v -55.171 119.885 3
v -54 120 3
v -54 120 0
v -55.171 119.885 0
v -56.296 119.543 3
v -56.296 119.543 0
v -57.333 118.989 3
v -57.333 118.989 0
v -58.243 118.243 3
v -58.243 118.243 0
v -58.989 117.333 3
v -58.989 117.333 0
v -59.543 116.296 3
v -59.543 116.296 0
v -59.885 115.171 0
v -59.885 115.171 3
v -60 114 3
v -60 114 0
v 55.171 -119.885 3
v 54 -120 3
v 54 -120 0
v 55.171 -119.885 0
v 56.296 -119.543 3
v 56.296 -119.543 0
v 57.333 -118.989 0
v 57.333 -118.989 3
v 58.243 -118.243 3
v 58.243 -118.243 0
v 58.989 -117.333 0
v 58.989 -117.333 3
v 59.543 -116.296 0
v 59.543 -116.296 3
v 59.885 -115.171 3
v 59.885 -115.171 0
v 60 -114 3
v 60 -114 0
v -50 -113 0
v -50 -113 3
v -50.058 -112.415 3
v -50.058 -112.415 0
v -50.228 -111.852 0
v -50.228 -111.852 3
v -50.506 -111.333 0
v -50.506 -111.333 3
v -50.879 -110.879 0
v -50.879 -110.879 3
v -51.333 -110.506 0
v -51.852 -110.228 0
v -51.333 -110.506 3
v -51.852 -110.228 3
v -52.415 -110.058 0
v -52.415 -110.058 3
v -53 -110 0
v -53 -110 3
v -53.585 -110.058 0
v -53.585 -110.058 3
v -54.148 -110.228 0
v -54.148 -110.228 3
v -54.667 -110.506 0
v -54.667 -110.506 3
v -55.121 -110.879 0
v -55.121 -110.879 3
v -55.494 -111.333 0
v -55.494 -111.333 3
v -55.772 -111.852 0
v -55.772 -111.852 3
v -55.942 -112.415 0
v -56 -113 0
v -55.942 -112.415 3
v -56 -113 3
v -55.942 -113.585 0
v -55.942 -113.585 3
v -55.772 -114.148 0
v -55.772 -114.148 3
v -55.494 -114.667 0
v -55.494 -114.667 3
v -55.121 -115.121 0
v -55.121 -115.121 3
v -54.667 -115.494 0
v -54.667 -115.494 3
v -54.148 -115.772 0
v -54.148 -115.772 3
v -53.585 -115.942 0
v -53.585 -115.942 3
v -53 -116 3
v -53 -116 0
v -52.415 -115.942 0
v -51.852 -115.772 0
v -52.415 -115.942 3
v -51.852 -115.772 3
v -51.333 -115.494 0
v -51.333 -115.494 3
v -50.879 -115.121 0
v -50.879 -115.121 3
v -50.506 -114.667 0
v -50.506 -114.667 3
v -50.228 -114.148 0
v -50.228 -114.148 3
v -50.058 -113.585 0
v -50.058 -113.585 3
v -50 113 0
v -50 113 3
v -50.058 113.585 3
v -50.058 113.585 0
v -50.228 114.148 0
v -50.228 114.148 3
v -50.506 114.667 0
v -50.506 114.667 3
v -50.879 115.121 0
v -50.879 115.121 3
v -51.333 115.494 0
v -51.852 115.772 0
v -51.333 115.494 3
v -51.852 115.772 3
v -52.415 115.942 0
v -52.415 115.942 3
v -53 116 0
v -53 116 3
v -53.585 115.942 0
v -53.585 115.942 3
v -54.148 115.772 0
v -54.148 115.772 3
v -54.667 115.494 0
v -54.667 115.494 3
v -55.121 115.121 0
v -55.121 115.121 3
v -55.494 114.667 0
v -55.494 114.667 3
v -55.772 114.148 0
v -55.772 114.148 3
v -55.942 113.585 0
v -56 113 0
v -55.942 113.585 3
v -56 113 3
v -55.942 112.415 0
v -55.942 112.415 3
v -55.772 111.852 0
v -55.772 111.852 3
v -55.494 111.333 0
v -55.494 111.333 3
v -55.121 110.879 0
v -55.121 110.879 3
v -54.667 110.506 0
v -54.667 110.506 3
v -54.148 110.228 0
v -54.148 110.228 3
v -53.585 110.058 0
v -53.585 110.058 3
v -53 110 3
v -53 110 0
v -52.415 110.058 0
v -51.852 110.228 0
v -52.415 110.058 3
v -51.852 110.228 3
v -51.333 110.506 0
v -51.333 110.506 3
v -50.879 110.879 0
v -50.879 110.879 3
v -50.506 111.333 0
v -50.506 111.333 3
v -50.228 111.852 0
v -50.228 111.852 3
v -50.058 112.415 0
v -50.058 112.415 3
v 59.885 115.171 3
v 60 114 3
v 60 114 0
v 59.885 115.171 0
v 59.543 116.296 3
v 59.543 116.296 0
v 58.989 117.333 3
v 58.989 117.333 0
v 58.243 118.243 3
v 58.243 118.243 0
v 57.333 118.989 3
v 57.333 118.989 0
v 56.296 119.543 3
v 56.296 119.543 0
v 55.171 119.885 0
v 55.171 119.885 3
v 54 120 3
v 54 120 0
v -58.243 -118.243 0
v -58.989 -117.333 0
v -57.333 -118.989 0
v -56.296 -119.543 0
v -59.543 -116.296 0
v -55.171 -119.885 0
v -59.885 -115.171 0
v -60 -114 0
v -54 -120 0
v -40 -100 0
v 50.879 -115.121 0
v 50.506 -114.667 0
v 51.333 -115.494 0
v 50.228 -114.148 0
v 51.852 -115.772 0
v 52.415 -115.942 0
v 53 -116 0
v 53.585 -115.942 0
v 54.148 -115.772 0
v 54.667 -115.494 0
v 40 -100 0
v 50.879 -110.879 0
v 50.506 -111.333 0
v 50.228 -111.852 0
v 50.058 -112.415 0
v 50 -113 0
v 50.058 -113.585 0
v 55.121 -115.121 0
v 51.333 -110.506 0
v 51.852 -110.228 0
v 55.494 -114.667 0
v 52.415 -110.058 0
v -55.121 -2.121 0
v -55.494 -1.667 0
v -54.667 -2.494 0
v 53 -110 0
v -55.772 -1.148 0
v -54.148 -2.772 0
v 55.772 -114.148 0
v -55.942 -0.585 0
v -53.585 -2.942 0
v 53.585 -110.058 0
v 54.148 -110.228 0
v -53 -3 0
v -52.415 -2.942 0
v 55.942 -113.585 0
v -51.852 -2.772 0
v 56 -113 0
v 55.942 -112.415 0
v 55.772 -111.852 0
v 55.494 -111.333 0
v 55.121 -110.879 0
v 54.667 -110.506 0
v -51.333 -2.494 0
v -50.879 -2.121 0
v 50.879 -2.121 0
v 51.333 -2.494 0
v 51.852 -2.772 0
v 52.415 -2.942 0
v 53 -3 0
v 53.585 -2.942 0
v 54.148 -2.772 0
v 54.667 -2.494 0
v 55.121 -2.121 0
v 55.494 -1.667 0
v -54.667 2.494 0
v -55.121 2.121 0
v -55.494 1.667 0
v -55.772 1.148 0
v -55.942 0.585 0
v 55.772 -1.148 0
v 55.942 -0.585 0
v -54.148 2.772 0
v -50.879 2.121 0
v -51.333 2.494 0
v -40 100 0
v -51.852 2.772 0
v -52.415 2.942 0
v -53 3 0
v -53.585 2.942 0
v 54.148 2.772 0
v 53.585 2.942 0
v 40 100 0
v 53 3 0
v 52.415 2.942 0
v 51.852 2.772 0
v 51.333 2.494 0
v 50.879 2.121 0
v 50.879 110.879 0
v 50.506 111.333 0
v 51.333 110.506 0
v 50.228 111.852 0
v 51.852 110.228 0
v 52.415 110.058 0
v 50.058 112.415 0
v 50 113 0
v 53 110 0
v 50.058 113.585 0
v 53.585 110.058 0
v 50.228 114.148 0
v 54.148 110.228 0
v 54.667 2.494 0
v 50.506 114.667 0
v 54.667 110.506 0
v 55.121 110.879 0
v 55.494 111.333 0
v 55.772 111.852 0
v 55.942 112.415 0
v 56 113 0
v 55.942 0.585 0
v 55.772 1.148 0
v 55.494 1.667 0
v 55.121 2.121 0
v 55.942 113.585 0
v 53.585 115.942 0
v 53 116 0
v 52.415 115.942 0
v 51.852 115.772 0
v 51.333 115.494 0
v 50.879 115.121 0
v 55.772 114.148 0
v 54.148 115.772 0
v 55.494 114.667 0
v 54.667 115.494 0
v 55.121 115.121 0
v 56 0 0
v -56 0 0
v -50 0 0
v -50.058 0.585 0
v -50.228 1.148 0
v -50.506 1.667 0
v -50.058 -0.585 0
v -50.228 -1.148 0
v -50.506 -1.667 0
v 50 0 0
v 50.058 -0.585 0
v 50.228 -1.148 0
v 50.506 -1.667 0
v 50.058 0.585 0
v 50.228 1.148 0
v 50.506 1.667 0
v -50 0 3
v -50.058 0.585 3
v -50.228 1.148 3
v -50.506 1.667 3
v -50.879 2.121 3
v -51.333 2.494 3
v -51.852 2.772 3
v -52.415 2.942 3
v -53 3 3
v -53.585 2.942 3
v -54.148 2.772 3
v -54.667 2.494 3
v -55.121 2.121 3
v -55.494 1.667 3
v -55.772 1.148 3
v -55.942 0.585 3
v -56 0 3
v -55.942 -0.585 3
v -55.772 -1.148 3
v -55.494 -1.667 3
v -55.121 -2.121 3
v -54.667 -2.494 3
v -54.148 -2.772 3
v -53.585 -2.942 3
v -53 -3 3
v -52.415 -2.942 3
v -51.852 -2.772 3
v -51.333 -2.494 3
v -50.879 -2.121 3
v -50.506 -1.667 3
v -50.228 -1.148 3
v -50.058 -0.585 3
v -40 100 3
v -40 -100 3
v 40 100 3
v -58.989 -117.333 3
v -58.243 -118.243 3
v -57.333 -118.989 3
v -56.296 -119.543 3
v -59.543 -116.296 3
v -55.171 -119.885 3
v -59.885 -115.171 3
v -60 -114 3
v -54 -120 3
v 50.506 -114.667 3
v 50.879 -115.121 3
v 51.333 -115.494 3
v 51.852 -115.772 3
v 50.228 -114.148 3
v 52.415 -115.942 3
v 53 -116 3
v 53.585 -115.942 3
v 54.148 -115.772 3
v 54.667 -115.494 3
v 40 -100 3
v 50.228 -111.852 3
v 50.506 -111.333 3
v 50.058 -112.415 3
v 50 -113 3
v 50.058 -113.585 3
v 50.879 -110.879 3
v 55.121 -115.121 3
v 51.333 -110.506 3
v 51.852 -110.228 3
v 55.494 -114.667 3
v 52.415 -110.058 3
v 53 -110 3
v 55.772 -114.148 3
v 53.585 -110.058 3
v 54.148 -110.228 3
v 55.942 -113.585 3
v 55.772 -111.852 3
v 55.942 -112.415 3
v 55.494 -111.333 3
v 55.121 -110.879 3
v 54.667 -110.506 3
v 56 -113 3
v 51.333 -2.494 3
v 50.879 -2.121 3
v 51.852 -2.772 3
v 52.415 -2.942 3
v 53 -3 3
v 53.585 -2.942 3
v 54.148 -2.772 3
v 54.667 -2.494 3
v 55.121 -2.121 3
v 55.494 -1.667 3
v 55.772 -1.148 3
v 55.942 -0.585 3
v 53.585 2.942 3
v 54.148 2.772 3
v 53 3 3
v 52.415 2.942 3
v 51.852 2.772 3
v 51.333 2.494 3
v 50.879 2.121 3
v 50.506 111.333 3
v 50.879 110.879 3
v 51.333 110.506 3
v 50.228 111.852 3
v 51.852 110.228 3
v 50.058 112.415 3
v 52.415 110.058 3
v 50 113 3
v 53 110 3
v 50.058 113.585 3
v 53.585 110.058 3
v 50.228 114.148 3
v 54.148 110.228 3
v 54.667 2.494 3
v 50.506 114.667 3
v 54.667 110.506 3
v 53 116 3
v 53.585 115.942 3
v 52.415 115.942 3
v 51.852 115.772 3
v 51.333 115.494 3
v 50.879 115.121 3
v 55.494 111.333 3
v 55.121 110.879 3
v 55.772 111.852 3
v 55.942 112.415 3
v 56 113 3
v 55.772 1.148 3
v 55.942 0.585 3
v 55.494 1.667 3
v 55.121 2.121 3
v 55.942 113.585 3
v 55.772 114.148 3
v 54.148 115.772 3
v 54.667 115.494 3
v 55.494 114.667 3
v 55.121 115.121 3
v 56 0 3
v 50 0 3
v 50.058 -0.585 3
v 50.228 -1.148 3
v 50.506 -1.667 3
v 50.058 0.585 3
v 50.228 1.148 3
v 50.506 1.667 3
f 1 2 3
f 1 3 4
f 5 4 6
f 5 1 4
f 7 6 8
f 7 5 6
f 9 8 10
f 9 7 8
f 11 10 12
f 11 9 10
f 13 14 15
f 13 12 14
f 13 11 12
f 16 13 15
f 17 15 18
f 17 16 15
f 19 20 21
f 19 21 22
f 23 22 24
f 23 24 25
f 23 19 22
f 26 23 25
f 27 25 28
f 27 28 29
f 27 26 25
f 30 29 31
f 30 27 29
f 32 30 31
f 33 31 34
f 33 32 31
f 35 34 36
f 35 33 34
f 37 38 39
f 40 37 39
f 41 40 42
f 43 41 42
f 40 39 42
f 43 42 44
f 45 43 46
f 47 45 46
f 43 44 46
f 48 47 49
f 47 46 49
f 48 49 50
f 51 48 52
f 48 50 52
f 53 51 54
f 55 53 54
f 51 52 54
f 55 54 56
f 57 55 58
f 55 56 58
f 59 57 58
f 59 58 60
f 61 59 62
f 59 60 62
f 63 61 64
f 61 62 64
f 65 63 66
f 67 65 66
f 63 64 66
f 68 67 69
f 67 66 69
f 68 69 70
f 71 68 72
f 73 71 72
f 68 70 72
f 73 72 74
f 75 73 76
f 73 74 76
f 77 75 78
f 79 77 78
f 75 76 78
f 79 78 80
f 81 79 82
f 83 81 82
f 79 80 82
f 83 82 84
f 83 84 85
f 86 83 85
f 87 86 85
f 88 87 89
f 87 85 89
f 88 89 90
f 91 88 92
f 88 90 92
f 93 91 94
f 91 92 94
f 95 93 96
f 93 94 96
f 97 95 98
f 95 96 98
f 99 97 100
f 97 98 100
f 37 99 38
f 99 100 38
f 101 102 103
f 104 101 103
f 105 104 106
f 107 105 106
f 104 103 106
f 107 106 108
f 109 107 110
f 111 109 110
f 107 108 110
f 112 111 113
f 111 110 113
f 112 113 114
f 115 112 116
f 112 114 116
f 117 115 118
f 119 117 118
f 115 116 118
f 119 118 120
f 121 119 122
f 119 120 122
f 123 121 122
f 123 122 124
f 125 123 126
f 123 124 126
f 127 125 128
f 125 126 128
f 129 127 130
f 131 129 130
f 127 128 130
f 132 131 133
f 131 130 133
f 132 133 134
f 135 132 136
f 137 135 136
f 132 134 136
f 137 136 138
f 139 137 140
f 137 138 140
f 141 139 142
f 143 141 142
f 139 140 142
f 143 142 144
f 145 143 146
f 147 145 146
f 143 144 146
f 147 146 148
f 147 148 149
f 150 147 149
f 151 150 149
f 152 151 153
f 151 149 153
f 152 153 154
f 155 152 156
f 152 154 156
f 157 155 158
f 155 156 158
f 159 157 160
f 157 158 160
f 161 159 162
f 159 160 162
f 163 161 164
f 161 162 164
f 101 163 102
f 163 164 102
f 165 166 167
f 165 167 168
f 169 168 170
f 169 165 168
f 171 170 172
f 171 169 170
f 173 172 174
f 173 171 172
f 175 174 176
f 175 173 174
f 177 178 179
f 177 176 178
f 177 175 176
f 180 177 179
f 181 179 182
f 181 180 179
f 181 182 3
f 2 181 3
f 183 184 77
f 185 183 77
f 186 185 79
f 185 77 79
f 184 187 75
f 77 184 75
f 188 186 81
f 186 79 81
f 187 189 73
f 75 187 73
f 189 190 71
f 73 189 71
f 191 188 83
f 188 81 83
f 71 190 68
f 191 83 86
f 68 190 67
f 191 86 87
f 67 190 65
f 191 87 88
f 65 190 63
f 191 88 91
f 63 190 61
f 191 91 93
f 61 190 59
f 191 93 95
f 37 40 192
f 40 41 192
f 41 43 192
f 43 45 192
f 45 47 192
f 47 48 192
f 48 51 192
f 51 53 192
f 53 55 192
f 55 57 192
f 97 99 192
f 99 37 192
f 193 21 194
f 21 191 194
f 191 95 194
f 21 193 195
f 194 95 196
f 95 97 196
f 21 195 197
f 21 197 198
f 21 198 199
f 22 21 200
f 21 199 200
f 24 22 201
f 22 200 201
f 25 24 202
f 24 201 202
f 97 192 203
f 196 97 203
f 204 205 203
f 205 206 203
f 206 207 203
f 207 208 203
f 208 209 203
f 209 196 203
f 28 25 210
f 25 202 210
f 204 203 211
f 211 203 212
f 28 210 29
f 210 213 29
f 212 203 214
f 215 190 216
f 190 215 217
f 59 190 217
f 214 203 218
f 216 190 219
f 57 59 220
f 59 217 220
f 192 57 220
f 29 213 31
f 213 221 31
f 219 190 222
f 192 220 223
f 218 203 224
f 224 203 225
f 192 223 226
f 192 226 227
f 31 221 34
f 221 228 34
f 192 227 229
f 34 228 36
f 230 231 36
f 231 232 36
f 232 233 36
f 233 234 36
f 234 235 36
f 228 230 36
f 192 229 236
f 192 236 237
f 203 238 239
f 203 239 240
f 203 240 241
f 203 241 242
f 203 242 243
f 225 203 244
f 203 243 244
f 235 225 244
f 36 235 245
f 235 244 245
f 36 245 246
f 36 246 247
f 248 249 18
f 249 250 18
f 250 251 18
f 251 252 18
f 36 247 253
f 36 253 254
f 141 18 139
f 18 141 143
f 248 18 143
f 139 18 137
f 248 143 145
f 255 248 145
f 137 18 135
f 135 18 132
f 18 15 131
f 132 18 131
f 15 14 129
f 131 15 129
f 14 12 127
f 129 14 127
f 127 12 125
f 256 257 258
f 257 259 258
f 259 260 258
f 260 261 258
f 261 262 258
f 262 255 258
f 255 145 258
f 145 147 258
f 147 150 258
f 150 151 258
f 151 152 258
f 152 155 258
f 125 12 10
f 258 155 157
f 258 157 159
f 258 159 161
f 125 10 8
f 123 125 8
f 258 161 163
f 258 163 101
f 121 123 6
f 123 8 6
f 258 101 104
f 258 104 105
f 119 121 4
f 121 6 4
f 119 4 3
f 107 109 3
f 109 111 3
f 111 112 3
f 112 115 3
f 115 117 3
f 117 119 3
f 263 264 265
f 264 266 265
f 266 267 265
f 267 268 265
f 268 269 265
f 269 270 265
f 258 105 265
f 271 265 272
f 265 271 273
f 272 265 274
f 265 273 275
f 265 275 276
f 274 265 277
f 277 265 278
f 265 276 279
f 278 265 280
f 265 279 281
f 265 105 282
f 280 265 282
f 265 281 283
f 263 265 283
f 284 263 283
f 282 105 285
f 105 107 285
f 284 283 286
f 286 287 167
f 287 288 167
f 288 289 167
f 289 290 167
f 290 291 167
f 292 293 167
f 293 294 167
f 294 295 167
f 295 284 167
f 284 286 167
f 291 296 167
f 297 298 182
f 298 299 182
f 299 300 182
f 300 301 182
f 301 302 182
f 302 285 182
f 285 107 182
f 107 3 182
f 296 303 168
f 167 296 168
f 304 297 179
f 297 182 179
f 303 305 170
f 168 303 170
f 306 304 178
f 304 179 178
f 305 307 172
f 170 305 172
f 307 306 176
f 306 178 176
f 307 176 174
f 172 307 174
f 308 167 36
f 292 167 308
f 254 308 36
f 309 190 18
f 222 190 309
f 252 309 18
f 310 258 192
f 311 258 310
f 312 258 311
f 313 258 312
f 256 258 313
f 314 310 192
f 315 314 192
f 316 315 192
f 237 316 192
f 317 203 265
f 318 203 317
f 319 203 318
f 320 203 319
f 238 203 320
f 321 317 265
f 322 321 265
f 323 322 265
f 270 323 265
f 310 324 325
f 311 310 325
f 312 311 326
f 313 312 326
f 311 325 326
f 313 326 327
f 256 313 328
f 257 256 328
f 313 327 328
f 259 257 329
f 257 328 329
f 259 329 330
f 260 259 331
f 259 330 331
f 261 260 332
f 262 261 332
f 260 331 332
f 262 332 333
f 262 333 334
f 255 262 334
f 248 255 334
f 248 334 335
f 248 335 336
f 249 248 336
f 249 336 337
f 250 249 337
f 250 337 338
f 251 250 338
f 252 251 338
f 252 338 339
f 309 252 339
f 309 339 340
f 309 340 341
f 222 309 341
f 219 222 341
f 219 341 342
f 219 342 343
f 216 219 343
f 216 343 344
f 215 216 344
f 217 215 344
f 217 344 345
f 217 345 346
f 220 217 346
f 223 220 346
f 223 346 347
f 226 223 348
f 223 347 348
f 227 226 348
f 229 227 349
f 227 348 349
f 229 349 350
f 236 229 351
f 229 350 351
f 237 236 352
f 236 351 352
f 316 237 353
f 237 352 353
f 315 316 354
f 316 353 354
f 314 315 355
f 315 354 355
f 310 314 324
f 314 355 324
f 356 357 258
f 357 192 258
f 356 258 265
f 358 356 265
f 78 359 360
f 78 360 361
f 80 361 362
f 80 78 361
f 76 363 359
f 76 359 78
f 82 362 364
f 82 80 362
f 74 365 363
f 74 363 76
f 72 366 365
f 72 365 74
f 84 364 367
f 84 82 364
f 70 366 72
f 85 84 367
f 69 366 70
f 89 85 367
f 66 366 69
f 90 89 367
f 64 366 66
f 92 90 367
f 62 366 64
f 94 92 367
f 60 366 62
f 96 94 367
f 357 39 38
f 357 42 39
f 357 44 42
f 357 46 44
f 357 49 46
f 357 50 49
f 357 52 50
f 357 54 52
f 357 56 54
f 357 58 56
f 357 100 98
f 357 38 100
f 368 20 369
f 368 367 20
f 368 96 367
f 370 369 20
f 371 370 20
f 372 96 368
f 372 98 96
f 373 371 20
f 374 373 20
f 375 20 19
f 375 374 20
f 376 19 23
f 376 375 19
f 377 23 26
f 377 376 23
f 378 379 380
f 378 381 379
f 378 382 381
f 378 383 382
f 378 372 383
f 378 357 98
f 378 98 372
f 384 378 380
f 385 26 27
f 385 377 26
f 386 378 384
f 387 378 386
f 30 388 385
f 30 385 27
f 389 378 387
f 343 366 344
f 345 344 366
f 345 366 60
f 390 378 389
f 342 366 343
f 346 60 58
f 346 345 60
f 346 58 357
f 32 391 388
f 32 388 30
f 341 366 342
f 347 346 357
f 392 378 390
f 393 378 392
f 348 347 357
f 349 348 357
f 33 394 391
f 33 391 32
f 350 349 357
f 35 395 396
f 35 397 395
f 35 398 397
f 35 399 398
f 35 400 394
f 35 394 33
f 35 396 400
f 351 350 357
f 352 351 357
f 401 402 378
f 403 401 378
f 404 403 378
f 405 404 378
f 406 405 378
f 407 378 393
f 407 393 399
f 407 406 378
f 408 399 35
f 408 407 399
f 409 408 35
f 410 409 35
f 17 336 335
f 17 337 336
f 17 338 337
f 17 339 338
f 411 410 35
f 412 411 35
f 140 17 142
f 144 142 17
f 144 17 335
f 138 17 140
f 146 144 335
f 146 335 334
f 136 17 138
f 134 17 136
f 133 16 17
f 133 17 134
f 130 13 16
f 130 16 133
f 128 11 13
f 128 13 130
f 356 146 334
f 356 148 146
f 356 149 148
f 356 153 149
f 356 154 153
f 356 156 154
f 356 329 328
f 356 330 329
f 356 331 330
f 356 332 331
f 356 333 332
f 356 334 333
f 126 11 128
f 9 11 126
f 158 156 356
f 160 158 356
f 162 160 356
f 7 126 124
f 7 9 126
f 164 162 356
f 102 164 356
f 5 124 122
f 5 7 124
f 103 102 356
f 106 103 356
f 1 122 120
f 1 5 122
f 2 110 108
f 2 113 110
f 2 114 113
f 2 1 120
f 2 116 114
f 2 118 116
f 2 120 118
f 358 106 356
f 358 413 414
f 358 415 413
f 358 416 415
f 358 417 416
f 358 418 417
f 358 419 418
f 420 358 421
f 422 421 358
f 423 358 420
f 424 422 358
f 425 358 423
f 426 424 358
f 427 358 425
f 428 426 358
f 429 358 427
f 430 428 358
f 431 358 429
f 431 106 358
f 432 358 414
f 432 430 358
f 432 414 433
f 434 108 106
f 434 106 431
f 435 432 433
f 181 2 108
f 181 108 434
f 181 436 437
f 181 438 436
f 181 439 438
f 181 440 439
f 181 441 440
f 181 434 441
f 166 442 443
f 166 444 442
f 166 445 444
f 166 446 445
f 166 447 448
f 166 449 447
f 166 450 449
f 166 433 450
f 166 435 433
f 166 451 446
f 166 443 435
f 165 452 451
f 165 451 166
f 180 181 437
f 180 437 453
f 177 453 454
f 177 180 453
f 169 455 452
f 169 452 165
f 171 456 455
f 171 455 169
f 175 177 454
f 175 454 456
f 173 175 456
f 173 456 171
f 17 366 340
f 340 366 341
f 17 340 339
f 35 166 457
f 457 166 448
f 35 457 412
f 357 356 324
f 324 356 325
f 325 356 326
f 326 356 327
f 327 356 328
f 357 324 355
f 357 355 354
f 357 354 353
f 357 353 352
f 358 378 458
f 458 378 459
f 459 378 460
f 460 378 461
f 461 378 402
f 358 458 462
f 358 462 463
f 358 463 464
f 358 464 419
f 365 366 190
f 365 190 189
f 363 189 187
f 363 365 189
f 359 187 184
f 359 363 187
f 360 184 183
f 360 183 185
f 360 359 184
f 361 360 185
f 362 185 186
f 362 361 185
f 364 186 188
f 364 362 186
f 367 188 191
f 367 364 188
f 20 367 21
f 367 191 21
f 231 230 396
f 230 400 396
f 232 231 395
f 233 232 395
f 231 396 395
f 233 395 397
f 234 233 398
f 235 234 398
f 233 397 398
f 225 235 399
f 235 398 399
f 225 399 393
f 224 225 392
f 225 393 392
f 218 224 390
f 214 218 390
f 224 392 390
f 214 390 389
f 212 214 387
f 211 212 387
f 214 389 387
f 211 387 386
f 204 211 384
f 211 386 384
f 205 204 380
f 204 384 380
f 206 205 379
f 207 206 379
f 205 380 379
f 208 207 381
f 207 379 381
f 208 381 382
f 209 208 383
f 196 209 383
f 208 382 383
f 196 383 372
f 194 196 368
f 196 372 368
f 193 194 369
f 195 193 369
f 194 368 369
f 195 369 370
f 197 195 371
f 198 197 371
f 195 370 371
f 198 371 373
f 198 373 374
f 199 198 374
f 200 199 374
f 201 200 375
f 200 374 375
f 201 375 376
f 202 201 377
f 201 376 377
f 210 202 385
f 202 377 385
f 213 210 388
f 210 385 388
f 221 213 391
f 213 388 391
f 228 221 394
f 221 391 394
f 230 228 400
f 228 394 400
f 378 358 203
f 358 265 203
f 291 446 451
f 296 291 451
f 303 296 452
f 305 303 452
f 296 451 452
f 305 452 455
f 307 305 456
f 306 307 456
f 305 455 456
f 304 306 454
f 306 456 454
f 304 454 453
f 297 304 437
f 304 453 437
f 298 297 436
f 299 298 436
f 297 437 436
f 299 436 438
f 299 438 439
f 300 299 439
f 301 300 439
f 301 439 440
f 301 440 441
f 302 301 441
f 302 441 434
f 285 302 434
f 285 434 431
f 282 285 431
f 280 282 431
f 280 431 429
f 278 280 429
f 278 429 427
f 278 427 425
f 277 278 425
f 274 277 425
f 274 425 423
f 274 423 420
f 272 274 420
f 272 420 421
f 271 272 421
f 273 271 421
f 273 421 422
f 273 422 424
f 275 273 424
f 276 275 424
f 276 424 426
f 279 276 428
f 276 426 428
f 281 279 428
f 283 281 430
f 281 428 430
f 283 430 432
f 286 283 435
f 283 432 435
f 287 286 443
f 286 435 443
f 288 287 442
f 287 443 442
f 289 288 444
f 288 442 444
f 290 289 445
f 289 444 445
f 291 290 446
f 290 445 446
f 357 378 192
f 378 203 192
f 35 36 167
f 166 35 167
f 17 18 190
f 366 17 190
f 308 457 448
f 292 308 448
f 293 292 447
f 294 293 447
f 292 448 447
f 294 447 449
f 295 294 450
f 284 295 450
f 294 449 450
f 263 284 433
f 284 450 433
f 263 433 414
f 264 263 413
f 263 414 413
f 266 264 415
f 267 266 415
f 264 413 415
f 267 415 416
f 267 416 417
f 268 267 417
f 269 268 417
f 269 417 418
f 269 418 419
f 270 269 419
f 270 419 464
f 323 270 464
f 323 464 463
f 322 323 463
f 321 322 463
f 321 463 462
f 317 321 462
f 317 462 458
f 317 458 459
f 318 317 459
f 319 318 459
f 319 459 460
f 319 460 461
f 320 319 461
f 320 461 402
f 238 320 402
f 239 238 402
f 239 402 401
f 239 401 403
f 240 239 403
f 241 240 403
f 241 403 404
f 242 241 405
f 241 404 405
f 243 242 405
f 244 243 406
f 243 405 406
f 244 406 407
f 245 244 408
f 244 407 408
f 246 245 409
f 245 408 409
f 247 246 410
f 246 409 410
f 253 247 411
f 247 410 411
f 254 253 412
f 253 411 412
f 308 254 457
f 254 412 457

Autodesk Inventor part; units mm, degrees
ref_plane "YZ Plane" through (0, 0, 0) normal (1, 0, 0) x (0, 1, 0)
ref_plane "XZ Plane" through (0, 0, 0) normal (0, 1, 0) x (-1, 0, 0)
ref_plane "XY Plane" through (0, 0, 0) normal (0, 0, 1) x (1, 0, 0)
sketch "Sketch1" plane through (0, 0, 0) normal (0, 0, 1) x (1, 0, 0)
  line L0 (-60, -120) -> (60, -120)
  line L1 (60, -120) -> (60, 120)
  line L2 (60, 120) -> (-60, 120)
  line L3 (-60, 120) -> (-60, -120)
  line L4 (-60, -120) -> (60, 120) construction
  line L5 (60, -120) -> (-60, 120) construction
  line L6 (40, -100) -> (-40, -100)
  line L7 (-40, -100) -> (-40, 100)
  line L8 (-40, 100) -> (40, 100)
  line L9 (40, 100) -> (40, -100)
  line L10 (40, -100) -> (-40, 100) construction
  line L11 (-40, -100) -> (40, 100) construction
  point P0 (0, 0)
  dimension "d172" = 80
  dimension "d180" = 20
  dimension "d181" = 20
  dimension "d182" = 200
extrude "Plate5" add sketch "Sketch1" along normal blind 3
sketch "Sketch9" plane through (0, 0, 3) normal (0, 0, 1) x (1, 0, 0)
  circle A0 centre (53, -113) radius 3
  line L0 (53, 113) -> (-53, 113) construction
  line L1 (-53, 113) -> (-53, -113) construction
  line L2 (-53, -113) -> (53, -113) construction
  line L3 (53, -113) -> (53, 113) construction
  line L4 (53, 113) -> (-53, -113) construction
  line L5 (-53, 113) -> (53, -113) construction
  circle A1 centre (-53, -113) radius 3
  circle A2 centre (53, 113) radius 3
  circle A3 centre (-53, 113) radius 3
  line L6 (-40, -100) -> (-40, 100) projected
  line L7 (-40, 100) -> (40, 100) projected
  line L8 (40, 100) -> (40, -100) projected
  line L9 (40, -100) -> (-40, -100) projected
  line L10 (60, -120) -> (-60, -120) projected
  line L11 (60, 120) -> (60, -120) projected
  line L12 (-60, 120) -> (60, 120) projected
  line L13 (-60, -120) -> (-60, 120) projected
  circle A4 centre (-53, 0) radius 3
  circle A5 centre (53, 0) radius 3
  point P0 (0, 0)
  dimension "d174" = 6
  dimension "d183" = 7
  dimension "d184" = 7
extrude "Cut2" cut sketch "Sketch9" against normal blind 3 contours A0 | A1 | A2 | A3 | A4 | A5
fillet "Corner Round1" radius 6 4 edges at (60, 120, 1.5) (-60, 120, 1.5) (-60, -120, 1.5) (60, -120, 1.5)
properties part number "TKS 3521 BOTTOM FDS Diam way flange 1" material "Stainless Steel"
